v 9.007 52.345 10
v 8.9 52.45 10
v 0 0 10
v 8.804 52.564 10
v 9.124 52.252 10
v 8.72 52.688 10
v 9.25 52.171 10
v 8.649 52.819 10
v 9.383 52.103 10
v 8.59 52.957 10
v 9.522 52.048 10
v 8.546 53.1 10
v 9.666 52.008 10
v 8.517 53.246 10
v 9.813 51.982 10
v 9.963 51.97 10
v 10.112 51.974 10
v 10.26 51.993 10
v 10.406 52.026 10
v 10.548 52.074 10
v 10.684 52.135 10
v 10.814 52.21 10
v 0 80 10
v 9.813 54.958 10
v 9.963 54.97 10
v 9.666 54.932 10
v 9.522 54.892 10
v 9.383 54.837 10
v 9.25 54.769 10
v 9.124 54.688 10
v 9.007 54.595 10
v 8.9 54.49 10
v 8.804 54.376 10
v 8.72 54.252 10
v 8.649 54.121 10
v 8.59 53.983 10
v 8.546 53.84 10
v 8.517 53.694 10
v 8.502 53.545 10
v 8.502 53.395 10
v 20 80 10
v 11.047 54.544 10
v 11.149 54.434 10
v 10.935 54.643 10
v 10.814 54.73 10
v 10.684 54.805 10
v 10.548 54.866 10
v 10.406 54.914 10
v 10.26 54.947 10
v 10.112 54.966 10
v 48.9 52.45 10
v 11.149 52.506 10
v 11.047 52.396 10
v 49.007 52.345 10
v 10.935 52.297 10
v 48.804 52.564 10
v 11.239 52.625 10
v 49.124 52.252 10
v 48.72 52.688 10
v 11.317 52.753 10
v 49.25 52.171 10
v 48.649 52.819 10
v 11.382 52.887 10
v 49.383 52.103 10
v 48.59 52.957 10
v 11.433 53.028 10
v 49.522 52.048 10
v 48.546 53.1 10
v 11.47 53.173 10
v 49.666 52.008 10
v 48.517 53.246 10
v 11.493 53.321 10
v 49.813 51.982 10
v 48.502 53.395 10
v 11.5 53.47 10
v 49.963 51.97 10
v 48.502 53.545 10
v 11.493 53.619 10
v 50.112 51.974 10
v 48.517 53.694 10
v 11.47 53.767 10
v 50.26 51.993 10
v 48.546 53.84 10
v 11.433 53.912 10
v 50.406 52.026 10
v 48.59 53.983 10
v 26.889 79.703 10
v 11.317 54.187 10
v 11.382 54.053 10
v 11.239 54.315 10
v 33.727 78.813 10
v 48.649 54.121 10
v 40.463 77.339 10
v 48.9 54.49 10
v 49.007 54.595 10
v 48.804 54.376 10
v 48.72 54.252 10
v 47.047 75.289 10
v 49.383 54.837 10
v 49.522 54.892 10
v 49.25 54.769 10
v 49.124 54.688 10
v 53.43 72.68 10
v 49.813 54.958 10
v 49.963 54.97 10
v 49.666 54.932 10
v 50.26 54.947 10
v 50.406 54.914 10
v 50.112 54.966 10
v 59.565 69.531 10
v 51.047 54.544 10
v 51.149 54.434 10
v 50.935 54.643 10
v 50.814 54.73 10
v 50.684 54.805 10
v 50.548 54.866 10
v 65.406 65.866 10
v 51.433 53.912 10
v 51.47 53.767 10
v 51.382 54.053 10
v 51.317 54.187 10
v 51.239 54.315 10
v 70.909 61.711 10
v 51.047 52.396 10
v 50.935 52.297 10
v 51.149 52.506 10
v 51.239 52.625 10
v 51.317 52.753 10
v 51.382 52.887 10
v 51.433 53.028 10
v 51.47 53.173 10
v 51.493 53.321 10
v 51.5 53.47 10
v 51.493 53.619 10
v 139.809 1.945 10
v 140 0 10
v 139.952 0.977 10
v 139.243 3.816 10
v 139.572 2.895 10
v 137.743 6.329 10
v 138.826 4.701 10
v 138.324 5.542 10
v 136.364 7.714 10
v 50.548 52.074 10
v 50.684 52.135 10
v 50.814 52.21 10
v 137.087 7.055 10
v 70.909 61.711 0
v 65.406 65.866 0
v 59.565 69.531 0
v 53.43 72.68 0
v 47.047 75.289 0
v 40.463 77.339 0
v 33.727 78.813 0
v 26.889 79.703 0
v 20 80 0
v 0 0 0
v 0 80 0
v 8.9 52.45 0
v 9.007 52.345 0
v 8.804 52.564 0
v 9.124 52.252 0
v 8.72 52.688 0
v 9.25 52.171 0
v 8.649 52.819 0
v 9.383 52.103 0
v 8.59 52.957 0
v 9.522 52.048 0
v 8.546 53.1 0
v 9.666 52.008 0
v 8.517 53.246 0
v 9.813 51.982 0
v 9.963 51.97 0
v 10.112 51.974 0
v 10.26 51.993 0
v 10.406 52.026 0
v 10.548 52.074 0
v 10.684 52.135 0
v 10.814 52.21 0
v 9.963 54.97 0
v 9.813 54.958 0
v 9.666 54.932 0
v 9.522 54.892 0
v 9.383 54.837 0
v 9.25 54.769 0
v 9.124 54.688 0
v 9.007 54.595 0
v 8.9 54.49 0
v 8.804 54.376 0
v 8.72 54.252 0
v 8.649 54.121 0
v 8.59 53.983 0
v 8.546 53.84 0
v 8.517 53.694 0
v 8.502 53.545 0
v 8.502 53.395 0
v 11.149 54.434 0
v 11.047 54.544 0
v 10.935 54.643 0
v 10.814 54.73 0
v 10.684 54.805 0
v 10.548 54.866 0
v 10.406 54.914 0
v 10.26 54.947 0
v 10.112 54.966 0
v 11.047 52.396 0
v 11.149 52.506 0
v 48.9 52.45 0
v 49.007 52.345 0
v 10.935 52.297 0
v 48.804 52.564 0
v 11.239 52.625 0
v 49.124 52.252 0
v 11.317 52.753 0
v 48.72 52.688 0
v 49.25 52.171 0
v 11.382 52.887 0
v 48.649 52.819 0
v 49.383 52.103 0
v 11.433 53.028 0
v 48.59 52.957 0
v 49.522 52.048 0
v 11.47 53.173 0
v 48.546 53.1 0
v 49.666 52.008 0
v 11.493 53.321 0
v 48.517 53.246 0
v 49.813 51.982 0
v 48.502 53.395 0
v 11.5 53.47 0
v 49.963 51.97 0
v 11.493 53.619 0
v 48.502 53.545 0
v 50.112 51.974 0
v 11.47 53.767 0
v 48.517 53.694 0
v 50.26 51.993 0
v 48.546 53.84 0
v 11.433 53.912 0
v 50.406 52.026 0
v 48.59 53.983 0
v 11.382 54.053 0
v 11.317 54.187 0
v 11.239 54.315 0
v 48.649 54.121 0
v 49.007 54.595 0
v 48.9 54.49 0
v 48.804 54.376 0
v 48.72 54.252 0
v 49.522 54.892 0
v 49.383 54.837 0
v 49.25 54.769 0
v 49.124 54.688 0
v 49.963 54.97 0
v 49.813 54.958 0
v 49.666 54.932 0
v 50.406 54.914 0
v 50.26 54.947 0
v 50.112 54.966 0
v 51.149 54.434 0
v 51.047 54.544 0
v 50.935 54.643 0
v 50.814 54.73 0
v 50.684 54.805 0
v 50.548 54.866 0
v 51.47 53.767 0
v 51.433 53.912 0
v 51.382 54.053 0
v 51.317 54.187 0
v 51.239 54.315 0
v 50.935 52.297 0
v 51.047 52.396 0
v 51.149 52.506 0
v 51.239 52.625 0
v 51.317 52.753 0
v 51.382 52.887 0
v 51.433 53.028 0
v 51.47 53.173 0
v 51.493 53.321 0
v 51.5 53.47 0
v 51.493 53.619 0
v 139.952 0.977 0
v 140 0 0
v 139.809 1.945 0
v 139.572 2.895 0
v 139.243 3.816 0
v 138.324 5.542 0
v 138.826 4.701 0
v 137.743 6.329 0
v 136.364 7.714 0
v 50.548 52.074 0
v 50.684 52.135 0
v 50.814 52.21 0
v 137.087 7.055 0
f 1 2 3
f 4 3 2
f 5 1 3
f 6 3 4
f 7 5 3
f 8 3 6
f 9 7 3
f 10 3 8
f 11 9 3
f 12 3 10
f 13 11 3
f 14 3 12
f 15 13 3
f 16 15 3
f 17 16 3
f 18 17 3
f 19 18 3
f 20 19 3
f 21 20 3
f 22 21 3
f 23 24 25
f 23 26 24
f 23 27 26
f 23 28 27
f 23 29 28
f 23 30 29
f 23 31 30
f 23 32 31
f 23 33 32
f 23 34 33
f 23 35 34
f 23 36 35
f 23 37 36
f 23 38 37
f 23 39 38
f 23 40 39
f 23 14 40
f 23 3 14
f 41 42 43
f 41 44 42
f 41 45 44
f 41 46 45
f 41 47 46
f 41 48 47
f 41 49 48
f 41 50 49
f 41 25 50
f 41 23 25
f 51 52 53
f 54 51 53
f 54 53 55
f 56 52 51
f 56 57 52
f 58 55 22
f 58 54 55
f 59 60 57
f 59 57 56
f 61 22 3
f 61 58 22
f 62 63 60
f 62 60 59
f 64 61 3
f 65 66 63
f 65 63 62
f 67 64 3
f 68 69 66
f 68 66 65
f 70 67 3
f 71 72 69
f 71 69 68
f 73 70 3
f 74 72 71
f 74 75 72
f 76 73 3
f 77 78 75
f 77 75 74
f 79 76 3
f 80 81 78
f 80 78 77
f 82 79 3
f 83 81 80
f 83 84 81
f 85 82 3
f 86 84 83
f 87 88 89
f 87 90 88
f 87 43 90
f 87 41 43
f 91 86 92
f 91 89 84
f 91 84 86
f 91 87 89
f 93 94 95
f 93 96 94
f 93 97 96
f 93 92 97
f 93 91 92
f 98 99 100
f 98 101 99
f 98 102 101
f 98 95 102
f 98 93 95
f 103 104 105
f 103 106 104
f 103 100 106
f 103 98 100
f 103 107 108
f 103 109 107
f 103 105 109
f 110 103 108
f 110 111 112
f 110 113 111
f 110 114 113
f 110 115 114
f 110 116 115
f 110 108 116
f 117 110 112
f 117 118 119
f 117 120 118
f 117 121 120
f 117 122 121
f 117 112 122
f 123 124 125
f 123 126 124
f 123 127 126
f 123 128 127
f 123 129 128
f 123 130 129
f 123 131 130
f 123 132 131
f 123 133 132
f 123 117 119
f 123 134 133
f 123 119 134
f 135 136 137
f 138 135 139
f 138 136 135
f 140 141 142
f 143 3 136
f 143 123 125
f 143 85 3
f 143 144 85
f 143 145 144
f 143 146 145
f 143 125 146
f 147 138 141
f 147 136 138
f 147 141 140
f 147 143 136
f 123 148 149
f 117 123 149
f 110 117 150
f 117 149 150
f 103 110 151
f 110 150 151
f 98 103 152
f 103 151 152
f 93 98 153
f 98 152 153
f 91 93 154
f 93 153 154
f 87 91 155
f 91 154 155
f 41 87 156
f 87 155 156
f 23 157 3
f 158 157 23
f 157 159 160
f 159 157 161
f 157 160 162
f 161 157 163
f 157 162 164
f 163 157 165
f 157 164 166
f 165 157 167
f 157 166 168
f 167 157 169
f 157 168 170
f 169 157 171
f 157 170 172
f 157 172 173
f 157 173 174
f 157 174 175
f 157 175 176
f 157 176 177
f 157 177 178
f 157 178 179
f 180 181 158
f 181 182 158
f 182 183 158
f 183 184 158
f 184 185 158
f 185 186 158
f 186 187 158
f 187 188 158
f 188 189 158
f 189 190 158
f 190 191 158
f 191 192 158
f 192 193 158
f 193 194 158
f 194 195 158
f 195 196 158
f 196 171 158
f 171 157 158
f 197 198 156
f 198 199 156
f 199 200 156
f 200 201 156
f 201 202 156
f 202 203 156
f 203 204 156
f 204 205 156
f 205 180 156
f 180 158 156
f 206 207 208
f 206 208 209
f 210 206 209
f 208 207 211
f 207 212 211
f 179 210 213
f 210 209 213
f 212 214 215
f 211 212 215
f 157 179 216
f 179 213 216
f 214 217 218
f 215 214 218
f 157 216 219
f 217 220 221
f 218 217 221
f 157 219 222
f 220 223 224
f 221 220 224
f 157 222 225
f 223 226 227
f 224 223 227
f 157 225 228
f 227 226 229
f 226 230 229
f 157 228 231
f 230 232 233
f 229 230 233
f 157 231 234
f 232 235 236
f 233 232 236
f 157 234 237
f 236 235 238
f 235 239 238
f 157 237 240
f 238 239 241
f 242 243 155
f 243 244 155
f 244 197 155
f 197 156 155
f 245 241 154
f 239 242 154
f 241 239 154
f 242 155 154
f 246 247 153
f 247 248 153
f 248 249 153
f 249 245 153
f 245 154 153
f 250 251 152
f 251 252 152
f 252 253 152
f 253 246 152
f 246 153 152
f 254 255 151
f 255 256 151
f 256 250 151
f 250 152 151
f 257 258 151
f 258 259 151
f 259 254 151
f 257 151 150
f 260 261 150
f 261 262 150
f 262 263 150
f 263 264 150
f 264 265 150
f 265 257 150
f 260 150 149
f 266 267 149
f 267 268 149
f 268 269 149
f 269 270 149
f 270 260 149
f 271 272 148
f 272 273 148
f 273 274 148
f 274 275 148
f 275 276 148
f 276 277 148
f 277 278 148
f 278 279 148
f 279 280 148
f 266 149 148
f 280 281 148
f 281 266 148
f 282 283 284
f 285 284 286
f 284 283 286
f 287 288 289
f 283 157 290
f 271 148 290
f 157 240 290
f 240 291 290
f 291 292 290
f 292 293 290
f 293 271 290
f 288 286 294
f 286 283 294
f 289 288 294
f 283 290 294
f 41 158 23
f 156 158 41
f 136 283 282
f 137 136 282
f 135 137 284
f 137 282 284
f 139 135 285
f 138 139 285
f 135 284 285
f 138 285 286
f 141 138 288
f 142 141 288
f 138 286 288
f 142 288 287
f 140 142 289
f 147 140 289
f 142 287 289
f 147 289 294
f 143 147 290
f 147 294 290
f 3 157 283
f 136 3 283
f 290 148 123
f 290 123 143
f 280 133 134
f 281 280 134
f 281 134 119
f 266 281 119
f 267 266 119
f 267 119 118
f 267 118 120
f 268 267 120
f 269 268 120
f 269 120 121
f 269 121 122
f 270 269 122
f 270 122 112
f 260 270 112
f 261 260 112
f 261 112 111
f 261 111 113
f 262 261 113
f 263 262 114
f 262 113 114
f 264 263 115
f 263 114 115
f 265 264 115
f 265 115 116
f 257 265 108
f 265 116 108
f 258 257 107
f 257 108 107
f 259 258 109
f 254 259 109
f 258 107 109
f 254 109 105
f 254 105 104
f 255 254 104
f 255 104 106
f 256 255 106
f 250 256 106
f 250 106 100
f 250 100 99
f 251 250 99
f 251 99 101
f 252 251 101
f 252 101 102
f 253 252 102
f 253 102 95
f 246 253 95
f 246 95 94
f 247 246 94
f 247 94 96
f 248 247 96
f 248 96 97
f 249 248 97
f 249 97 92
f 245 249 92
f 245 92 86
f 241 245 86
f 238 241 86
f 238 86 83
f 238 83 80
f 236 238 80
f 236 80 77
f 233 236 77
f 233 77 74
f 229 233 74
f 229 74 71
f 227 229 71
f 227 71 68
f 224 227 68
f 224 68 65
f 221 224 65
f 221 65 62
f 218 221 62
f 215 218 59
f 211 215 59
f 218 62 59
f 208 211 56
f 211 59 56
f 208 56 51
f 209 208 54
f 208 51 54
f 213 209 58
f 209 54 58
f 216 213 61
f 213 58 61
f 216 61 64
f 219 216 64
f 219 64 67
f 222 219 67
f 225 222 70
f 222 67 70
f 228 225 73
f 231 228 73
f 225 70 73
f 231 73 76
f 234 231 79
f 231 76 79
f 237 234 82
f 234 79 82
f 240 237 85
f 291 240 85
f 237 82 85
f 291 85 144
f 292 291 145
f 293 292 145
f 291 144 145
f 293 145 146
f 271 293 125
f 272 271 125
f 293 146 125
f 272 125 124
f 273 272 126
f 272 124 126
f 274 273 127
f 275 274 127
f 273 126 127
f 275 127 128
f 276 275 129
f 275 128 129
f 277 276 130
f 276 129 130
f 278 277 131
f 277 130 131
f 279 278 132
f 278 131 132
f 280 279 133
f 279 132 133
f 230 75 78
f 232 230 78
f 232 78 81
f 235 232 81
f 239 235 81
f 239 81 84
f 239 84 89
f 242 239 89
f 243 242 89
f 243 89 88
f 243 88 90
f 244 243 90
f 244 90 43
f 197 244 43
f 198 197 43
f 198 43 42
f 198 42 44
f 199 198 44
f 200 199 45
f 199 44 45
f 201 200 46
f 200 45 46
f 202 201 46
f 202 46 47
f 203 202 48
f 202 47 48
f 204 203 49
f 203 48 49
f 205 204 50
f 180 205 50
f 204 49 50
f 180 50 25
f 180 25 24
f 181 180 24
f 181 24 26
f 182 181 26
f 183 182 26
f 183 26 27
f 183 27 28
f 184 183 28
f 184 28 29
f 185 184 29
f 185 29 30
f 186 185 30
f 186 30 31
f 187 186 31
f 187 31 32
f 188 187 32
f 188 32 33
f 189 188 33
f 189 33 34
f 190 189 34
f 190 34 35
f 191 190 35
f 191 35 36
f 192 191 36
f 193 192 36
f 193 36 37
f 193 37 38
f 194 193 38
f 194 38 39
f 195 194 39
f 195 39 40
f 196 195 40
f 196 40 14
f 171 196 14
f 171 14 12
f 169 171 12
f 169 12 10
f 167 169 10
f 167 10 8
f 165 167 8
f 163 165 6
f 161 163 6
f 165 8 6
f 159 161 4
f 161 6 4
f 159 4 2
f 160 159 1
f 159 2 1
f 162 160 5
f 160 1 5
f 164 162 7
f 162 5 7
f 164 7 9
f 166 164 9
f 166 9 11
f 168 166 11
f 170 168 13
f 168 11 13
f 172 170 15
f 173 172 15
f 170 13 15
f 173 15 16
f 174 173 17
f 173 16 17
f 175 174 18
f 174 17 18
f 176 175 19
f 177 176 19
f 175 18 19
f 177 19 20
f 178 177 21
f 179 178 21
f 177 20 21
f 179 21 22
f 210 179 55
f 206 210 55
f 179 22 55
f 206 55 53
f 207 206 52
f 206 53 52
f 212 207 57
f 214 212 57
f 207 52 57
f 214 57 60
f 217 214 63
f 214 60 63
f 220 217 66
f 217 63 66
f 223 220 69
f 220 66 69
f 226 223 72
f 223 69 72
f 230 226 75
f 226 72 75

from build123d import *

# Parameters (mm, degrees)
PAD_DEPTH    = 10
SKETCH001_R  = 1.5
POCKET_DEPTH = 10.001


with BuildPart() as part:
    # Sketch → Pad (new body)
    with BuildSketch(Plane.XY):
        with BuildLine():
            Line((0, 0), (140, 0))
            ThreePointArc((140, 0), (139.04534, 4.264014), (136.363636, 7.713892))
            Line((70.909026, 61.711191), (136.363636, 7.713892))
            ThreePointArc((70.909026, 61.711191), (47.047216, 75.289097), (19.999983, 80))
            Line((0, 80), (19.999983, 80))
            Line((0, 0), (0, 80))
        make_face()
    extrude(amount=PAD_DEPTH)

    # Sketch001 → Pocket (cut, through all)
    with BuildSketch(Plane.XY.offset(10)):
        with Locations((10, 53.47)):
            Circle(SKETCH001_R)
        with Locations((50, 53.47)):
            Circle(SKETCH001_R)
    extrude(amount=-POCKET_DEPTH, mode=Mode.SUBTRACT)


solid = part.part
